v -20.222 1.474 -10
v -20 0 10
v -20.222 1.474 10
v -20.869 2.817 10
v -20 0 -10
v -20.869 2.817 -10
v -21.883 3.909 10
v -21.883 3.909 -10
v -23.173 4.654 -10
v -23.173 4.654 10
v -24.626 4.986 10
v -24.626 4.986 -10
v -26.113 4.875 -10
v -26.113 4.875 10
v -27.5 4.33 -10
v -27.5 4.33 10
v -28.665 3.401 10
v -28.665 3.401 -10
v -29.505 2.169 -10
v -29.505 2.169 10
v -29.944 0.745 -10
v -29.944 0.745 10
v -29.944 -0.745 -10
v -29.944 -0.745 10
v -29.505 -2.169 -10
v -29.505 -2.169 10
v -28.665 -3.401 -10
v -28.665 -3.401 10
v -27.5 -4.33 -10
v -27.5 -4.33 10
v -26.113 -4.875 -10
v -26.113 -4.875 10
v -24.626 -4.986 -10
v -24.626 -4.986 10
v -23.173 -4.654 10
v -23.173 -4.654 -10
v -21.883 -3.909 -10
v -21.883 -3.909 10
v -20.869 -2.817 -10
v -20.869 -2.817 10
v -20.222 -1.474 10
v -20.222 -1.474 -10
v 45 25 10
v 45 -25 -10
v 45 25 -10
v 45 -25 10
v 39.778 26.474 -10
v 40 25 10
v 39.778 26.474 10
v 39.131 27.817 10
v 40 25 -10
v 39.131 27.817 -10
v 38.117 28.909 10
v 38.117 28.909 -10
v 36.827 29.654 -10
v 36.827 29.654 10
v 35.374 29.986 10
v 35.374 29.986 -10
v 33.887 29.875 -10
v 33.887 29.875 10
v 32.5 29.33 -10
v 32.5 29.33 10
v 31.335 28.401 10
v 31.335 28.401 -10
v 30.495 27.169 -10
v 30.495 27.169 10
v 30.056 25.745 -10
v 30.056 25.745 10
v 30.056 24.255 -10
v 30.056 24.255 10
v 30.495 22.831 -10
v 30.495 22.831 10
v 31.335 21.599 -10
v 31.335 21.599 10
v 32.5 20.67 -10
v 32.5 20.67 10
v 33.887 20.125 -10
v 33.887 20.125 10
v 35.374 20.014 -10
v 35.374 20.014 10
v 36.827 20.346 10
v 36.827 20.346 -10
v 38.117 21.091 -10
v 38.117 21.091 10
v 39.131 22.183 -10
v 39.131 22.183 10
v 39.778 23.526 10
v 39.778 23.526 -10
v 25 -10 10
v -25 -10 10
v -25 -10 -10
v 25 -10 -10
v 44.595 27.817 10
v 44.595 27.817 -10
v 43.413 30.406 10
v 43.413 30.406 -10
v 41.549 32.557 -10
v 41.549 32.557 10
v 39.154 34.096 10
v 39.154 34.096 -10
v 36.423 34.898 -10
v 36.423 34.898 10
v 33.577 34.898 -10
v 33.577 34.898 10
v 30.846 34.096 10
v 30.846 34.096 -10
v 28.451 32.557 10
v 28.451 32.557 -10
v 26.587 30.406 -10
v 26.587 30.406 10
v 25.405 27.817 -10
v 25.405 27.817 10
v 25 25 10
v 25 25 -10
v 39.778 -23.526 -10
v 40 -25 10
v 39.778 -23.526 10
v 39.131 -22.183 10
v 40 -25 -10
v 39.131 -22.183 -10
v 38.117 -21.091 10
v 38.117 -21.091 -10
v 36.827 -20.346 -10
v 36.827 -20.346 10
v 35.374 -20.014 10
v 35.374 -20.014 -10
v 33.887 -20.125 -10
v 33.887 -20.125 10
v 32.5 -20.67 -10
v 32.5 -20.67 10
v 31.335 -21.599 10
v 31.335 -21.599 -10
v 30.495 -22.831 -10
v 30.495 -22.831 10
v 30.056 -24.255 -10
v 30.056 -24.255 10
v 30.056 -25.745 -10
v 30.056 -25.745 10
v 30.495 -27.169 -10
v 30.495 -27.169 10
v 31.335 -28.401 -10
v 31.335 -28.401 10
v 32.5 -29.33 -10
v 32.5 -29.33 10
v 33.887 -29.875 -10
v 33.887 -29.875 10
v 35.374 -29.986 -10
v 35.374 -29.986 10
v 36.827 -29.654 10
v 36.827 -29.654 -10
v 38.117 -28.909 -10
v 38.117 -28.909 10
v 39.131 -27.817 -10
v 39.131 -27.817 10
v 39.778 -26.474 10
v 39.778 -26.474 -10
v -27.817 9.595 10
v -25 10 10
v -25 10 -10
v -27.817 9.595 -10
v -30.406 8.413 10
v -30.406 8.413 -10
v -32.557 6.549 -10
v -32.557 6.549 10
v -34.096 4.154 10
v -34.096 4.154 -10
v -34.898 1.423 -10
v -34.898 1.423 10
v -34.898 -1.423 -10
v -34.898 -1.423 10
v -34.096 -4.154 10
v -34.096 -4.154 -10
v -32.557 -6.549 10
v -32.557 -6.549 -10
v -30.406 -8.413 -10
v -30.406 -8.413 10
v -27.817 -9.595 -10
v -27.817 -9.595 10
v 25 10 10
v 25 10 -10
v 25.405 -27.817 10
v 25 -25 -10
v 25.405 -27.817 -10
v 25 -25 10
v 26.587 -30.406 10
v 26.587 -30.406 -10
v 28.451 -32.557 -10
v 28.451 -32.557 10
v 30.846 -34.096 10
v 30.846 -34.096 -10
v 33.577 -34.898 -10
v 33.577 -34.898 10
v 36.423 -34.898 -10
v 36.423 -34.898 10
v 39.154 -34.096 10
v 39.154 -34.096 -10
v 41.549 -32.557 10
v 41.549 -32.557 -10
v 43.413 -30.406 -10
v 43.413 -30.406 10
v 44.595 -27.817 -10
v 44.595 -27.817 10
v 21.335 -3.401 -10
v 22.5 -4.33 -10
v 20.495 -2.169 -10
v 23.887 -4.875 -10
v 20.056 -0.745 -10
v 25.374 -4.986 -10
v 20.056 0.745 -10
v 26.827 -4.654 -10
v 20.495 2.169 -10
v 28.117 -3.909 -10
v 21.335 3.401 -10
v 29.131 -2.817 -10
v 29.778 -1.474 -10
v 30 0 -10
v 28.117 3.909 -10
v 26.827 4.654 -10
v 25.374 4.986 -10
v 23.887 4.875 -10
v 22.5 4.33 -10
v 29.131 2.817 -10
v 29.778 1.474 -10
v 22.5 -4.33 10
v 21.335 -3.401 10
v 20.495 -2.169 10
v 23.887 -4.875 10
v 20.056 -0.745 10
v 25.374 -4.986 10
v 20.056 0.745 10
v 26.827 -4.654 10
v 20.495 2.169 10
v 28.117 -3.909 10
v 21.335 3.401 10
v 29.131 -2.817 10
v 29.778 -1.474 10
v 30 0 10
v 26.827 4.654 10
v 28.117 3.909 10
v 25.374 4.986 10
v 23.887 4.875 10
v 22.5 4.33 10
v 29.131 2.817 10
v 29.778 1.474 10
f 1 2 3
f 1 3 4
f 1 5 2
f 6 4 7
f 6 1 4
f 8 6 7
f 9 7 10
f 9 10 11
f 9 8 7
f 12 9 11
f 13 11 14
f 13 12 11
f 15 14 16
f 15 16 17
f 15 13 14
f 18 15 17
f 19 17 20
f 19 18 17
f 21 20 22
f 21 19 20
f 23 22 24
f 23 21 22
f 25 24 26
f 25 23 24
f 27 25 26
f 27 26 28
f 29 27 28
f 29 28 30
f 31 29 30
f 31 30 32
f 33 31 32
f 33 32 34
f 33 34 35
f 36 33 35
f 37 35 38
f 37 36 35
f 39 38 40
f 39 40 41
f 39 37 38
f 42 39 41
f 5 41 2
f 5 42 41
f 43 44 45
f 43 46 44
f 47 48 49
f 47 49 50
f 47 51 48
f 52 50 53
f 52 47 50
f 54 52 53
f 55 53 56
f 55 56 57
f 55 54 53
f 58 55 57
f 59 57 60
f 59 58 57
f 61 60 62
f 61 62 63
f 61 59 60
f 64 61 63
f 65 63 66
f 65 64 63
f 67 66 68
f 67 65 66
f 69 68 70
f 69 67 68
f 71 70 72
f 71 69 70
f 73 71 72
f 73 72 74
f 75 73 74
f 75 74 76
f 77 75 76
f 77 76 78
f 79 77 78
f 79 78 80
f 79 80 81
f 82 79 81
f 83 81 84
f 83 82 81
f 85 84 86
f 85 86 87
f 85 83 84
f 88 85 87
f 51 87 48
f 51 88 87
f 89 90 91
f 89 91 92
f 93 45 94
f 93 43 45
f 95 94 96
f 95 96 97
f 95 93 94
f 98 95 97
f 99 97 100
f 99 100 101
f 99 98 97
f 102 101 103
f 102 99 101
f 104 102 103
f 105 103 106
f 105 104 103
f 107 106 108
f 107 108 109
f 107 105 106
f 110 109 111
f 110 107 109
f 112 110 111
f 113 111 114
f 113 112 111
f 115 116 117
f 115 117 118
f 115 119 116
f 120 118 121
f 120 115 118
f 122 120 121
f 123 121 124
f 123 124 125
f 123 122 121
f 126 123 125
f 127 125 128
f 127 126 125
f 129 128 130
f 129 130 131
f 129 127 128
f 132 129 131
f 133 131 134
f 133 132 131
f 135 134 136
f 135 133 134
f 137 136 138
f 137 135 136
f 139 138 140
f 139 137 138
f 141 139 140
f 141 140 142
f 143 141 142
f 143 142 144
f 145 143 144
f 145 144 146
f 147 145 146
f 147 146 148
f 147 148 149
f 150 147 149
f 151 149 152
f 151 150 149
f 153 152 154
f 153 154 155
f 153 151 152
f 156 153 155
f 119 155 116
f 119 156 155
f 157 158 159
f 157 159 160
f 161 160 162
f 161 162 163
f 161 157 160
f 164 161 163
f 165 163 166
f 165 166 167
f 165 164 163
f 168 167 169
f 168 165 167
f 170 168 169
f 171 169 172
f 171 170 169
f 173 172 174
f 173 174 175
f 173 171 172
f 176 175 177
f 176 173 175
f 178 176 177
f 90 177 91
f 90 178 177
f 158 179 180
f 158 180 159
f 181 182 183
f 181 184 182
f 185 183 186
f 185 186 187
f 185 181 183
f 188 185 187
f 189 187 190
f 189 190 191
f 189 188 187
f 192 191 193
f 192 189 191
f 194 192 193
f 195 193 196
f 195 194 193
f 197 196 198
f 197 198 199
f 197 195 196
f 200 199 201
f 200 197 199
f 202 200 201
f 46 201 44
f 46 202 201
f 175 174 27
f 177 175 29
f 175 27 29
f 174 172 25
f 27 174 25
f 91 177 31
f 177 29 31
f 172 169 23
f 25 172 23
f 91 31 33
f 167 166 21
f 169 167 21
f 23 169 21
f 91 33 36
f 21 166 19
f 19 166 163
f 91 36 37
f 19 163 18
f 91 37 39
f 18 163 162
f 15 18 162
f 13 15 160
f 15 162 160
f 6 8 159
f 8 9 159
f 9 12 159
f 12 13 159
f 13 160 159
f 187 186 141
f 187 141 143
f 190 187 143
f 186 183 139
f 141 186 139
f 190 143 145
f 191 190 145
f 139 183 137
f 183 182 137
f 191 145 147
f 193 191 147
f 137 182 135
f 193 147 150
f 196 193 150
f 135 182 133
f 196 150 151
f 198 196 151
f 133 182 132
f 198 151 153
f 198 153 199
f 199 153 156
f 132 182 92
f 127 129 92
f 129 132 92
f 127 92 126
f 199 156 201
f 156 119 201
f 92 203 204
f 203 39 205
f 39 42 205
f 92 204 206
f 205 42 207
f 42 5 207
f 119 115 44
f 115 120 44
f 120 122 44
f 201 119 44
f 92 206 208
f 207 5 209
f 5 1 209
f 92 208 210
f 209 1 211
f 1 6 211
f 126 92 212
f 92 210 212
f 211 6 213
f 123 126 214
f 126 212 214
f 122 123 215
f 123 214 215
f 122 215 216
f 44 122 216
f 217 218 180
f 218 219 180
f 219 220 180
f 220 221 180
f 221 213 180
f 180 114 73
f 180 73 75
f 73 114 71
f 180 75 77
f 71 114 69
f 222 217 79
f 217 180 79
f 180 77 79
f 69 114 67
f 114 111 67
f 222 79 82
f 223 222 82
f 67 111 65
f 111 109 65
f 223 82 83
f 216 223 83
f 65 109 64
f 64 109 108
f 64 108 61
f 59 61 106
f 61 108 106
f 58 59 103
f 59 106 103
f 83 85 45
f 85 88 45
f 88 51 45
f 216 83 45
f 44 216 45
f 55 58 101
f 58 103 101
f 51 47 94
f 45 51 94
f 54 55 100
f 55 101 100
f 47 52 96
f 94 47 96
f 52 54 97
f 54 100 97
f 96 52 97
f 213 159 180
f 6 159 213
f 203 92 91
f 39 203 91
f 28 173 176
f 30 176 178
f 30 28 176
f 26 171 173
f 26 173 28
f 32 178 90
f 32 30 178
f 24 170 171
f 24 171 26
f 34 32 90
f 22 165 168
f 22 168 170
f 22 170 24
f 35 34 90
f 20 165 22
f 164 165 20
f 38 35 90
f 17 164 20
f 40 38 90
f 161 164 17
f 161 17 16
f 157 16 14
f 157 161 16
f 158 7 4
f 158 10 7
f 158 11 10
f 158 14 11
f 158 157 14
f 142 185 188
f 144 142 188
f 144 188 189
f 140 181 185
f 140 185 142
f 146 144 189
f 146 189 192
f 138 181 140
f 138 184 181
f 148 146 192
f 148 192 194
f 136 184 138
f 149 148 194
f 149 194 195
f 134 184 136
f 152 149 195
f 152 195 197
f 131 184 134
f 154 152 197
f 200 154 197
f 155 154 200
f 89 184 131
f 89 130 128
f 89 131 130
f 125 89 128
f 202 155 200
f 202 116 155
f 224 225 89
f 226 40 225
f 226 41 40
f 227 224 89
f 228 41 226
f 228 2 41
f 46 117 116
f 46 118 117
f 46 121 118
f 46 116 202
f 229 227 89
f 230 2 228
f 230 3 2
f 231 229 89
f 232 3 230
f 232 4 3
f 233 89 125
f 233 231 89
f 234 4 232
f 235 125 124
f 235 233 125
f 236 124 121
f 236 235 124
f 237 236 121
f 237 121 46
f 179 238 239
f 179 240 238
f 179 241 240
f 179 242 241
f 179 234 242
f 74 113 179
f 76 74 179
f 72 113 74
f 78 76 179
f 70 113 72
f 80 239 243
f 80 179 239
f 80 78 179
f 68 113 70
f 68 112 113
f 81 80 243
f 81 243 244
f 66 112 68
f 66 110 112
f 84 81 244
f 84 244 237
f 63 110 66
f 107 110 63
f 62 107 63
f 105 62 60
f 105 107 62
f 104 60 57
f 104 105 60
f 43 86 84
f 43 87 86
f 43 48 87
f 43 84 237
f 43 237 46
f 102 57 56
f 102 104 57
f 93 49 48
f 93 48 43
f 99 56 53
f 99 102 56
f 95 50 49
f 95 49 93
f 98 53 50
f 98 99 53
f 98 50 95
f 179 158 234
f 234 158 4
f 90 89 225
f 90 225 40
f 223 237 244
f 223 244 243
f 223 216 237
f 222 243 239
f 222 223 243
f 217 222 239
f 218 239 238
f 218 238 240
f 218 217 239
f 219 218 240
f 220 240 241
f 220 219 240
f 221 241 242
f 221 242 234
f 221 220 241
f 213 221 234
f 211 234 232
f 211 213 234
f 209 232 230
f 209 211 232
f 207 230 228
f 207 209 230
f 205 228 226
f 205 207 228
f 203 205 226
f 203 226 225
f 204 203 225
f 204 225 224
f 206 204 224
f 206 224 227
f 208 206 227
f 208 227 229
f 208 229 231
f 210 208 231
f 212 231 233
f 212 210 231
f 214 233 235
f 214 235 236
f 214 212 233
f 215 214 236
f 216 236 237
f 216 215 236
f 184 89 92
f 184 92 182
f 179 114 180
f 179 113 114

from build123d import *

# Parameters (mm, degrees)
F0_R     = 5
F1_DEPTH = 10


with BuildPart() as f1:
    # F0 (on Top) → F1 (new body, symmetric)
    with BuildSketch(Plane.XY):
        with BuildLine():
            Line((25, 25), (25, 10))
            Line((25, 10), (-25, 10))
            ThreePointArc((-25, 10), (-35, 0), (-25, -10))
            Line((-25, -10), (25, -10))
            Line((25, -10), (25, -25))
            ThreePointArc((25, -25), (35, -35), (45, -25))
            Line((45, -25), (45, 25))
            ThreePointArc((45, 25), (35, 35), (25, 25))
        make_face()
        with Locations((35, -25)):
            Circle(F0_R, mode=Mode.SUBTRACT)
        with Locations((-25, 0)):
            Circle(F0_R, mode=Mode.SUBTRACT)
        with Locations((25, 0)):
            Circle(F0_R, mode=Mode.SUBTRACT)
        with Locations((35, 25)):
            Circle(F0_R, mode=Mode.SUBTRACT)
    extrude(amount=F1_DEPTH, both=True)


solid = f1.part
